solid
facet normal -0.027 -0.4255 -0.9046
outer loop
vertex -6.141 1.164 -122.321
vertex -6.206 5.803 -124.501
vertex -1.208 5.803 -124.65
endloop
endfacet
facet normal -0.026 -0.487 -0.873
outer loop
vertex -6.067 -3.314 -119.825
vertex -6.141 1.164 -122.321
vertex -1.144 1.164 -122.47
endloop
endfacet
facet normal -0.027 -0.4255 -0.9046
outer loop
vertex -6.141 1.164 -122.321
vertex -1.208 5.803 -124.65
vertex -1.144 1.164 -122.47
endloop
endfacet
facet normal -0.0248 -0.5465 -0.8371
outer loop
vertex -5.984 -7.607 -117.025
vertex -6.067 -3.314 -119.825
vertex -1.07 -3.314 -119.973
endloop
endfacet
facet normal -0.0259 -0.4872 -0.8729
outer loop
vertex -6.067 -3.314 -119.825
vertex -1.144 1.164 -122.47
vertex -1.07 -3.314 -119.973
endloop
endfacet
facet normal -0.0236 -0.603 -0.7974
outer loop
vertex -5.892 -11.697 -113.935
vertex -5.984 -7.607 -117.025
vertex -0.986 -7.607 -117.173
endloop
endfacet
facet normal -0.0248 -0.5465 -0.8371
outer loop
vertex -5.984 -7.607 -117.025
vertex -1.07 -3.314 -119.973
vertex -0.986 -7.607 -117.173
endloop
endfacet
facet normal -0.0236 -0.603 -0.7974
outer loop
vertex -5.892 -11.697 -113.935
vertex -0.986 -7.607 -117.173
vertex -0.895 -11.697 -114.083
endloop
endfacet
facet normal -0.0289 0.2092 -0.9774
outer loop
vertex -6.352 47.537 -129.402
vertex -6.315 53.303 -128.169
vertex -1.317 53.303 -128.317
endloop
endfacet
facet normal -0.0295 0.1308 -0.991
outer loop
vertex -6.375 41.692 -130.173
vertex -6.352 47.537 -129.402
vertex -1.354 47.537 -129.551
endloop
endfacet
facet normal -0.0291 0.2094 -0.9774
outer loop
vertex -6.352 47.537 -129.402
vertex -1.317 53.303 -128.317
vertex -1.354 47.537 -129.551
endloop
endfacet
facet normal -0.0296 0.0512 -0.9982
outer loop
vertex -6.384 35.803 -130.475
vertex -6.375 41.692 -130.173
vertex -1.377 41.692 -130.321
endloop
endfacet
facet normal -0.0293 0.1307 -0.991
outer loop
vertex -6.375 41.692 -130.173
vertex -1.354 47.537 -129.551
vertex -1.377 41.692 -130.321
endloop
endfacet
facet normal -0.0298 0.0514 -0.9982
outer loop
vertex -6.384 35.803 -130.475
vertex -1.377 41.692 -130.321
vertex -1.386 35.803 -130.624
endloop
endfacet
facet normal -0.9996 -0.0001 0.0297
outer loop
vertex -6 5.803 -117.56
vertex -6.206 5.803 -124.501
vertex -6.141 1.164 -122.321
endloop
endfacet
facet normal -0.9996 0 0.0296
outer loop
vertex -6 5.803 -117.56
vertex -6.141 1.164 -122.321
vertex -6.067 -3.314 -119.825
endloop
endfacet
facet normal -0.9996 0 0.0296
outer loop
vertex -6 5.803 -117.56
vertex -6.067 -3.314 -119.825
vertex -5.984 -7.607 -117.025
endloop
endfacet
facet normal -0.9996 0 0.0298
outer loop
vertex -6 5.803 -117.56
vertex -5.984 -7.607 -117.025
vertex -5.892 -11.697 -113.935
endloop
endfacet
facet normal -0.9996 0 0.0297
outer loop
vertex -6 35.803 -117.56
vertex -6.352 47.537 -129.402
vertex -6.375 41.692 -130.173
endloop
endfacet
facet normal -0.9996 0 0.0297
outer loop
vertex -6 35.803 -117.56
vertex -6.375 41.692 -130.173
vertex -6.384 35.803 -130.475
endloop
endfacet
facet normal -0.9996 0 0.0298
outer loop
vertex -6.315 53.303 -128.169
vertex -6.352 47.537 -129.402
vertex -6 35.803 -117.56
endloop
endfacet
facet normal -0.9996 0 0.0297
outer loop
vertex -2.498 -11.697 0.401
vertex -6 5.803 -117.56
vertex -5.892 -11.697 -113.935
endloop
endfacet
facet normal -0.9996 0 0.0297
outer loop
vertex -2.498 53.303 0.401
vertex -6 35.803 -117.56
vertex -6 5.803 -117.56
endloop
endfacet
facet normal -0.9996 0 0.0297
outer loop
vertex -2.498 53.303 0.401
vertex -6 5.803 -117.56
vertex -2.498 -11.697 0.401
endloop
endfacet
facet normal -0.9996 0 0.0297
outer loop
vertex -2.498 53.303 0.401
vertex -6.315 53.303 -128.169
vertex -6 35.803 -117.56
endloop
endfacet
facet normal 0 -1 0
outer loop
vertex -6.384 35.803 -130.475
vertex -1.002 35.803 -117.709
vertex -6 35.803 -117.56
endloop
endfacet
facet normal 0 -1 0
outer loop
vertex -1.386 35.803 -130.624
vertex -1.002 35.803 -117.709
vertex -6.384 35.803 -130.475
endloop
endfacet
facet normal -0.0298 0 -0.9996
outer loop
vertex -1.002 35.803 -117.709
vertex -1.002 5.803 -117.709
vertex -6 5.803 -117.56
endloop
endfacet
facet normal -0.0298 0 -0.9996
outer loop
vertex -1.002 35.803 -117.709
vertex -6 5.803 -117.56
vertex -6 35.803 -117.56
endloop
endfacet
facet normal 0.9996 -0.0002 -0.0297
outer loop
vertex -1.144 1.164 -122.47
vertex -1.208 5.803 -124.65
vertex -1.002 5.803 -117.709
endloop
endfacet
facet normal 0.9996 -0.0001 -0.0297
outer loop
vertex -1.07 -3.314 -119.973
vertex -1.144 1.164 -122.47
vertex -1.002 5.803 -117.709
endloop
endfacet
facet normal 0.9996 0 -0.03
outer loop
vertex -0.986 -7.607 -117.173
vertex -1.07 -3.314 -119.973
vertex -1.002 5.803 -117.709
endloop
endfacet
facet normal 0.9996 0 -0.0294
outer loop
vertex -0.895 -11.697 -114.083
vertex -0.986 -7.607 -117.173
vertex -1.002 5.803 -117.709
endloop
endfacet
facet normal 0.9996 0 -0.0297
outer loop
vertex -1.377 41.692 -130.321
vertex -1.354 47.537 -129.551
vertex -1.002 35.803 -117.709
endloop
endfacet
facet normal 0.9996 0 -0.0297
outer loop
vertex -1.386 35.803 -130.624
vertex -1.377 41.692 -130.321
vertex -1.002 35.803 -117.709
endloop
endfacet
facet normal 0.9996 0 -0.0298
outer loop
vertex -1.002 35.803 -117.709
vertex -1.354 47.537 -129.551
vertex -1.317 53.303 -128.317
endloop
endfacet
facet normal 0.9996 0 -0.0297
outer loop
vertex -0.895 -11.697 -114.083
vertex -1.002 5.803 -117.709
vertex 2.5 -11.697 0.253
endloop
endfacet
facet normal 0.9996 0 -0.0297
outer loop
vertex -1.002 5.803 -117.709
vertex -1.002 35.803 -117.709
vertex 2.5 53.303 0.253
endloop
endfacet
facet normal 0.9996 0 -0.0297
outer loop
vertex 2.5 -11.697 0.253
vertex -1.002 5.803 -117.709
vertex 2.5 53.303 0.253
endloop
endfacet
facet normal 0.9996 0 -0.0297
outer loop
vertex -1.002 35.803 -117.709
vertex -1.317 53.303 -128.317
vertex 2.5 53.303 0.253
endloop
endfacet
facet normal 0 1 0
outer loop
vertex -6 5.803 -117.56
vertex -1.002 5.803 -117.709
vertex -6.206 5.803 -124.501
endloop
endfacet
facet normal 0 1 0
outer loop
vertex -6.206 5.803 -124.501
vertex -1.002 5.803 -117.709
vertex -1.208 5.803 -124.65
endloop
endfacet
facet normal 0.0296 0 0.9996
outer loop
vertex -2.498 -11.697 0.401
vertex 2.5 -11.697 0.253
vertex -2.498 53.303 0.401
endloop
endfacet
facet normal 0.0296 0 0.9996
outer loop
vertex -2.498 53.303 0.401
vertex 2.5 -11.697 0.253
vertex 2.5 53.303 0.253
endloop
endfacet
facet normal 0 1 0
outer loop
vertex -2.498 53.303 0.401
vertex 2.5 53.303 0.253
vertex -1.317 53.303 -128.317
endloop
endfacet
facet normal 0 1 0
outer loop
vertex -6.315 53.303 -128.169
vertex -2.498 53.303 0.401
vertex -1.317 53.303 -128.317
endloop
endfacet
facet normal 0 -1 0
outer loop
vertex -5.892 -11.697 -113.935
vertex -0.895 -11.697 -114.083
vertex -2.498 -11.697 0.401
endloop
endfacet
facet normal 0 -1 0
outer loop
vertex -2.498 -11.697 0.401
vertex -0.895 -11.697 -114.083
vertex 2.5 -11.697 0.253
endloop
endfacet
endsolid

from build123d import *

# Parameters (mm, degrees)
SALIENTE_EXTRUIR2_DEPTH = 5
CROQUIS3_W              = 15
CROQUIS3_H              = 30
CORTAR_EXTRUIR2_DEPTH   = 10


with BuildPart() as part:
    # Croquis2 → Saliente-Extruir2 (new body)
    with BuildSketch(Plane(origin=(2.49030702, 0, -0.073938452), x_dir=(-0.029677418771206387, 0, -0.999559528399924), z_dir=(0.999559528399924, 0, -0.029677418771206387))):
        with BuildLine():
            Line((-0.326611286, 53.303101177), (116.885919238, 53.303101177))
            Line((116.885919238, 53.303101177), (128.299912644, 53.303101177))
            ThreePointArc((128.299912644, 53.303101177), (128.897751071, 19.112162844), (114.059307952, -11.696898823))
            Line((114.059307952, -11.696898823), (-0.326611286, -11.696898823))
            Line((-0.326611286, -11.696898823), (-0.326611286, 53.303101177))
        make_face()
    extrude(amount=-SALIENTE_EXTRUIR2_DEPTH)

    # Croquis3 → Cortar-Extruir2 (cut)
    with BuildSketch(Plane(origin=(2.49030702, 0, -0.073938452), x_dir=(-0.029677418771206443, 0, -0.999559528399924), z_dir=(0.999559528399924, 0, -0.029677418771206443))):
        with Locations((125.186431424, 20.803101177)):
            Rectangle(CROQUIS3_W, CROQUIS3_H)
    extrude(amount=-CORTAR_EXTRUIR2_DEPTH, mode=Mode.SUBTRACT)


solid = part.part
